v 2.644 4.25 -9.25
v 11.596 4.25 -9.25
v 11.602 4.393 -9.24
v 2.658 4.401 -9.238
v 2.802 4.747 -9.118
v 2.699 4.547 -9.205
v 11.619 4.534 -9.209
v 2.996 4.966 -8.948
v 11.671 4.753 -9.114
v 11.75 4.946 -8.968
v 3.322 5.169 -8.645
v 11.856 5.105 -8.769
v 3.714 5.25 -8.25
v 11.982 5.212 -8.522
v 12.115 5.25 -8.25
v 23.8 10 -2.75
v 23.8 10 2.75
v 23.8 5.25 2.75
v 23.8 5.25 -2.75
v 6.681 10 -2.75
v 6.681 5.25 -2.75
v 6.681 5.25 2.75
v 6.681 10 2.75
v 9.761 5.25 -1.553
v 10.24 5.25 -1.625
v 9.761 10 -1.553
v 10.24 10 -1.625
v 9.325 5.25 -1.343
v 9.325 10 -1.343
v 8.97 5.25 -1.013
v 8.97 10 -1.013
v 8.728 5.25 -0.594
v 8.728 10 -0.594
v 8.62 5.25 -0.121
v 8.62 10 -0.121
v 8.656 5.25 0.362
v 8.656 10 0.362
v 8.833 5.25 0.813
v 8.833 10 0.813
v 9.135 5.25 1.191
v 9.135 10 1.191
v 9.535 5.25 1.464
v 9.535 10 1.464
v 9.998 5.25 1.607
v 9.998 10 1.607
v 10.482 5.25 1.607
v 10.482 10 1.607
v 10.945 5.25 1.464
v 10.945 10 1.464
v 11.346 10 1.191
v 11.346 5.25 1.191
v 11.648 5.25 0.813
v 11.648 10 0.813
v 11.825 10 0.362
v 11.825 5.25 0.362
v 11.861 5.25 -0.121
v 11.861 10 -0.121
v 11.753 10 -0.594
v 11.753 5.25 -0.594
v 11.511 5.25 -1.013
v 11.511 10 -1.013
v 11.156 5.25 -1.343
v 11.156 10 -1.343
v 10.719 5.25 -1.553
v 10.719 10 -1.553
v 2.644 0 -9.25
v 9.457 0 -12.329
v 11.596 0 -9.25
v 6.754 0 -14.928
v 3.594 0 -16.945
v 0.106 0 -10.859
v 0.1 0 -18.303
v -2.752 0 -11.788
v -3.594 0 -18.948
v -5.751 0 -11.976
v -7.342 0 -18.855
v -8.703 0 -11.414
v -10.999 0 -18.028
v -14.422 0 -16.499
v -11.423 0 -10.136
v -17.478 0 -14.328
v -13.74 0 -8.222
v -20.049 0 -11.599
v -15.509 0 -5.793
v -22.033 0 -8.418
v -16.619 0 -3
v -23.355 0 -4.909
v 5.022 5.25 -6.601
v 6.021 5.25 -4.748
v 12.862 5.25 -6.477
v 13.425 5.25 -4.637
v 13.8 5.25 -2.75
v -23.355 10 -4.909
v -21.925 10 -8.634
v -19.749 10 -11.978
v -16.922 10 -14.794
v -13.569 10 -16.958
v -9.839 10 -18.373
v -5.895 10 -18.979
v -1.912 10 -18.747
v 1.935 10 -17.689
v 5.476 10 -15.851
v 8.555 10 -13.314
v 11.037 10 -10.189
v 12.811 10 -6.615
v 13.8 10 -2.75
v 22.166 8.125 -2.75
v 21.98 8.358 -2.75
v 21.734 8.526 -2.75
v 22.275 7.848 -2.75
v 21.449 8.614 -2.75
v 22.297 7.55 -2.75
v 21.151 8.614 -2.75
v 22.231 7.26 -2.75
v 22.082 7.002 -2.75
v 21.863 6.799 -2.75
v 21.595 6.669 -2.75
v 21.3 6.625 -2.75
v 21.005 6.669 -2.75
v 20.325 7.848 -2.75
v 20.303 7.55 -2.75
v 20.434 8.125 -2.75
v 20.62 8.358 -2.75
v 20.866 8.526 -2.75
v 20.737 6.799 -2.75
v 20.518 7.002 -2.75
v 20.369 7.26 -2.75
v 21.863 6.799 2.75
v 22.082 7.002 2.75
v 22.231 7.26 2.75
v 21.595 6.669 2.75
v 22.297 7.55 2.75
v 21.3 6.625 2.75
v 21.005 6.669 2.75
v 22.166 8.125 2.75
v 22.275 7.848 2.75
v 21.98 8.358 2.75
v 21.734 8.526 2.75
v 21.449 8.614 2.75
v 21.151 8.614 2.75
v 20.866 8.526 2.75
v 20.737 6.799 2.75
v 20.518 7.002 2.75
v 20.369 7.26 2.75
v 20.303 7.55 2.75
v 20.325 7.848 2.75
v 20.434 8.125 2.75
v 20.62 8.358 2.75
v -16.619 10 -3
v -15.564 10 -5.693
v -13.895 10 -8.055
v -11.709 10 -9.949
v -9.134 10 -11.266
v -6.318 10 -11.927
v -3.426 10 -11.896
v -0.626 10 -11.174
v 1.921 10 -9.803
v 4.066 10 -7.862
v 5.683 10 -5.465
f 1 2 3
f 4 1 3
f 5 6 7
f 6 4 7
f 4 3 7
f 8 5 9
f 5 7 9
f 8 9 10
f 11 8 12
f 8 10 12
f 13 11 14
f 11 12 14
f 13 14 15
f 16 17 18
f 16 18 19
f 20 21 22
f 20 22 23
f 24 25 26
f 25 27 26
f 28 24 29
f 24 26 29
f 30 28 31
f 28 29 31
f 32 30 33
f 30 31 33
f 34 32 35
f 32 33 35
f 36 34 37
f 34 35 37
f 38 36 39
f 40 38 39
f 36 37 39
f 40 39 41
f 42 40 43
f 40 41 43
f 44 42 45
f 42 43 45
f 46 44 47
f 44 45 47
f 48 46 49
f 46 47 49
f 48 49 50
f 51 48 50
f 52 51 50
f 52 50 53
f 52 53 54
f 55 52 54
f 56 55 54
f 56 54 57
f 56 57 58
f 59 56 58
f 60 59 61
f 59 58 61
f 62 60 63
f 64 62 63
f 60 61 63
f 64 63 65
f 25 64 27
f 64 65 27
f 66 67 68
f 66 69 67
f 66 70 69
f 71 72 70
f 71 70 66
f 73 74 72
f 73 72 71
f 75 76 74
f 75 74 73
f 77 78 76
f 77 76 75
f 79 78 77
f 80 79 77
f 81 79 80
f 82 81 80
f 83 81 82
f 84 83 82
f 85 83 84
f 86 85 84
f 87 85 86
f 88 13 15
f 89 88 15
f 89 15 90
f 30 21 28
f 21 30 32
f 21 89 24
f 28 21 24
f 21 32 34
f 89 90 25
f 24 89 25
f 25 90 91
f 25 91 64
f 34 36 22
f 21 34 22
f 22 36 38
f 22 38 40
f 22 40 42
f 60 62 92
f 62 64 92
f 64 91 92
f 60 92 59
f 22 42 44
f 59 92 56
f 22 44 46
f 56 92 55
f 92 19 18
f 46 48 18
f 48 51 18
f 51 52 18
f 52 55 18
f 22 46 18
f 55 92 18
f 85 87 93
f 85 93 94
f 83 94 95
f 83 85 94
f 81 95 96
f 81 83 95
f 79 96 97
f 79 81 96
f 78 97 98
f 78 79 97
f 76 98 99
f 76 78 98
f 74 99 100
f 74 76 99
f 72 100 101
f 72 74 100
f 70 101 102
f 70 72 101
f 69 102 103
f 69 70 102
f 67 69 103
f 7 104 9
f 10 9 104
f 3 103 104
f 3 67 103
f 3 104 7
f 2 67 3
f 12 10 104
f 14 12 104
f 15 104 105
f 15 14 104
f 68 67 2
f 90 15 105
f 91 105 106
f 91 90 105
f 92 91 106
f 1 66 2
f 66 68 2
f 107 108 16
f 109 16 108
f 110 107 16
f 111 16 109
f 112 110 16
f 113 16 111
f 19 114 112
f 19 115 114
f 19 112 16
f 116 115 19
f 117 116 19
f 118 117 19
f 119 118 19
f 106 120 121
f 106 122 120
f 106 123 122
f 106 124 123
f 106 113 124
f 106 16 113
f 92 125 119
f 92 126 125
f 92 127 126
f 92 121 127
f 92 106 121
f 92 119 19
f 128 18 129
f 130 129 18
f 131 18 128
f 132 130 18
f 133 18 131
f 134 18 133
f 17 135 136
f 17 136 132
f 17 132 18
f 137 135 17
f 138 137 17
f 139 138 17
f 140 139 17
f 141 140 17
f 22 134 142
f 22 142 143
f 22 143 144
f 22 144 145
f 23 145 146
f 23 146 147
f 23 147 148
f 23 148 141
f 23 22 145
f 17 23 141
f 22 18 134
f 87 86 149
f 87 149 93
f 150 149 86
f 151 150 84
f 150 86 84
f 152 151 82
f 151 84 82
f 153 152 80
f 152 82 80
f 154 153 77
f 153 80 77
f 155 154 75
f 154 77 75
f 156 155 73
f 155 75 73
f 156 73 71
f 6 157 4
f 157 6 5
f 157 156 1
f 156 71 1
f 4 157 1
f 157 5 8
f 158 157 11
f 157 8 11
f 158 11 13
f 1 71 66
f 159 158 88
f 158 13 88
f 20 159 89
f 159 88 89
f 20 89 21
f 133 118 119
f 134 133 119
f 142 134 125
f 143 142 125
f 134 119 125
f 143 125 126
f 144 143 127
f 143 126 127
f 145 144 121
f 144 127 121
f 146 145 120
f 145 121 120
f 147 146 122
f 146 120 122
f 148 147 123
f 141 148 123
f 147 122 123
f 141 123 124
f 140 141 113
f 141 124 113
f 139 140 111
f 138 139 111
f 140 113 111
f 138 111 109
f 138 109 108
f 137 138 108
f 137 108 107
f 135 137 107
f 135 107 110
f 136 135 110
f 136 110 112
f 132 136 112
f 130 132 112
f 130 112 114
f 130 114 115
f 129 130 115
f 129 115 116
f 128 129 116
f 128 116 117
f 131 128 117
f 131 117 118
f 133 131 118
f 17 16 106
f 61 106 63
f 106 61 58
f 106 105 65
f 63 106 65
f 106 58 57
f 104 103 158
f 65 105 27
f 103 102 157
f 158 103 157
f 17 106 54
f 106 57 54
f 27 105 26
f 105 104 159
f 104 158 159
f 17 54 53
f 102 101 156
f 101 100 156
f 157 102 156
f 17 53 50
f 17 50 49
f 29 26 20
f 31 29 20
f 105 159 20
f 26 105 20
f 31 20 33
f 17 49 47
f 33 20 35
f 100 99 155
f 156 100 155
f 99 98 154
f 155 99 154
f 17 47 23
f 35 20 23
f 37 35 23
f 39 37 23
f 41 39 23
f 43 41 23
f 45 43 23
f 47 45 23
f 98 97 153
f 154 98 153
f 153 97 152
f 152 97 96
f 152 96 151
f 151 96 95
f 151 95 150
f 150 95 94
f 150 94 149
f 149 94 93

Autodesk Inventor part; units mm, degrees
ref_plane "YZ Plane" through (0, 0, 0) normal (1, 0, 0) x (0, 1, 0)
ref_plane "XZ Plane" through (0, 0, 0) normal (0, 1, 0) x (-1, 0, 0)
sketch "Sketch1" plane through (0, 0, 0) normal (0, 1, 0) x (-1, 0, 0)
  line L0 (5, 0) -> (16.619, -3)
  line L1 (5, 0) -> (-7, 0)
  arc A0 (-7, 0) -> (16.619, -3) centre (5, 0) ccw
  line L2 (0, 0) -> (-12, 0)
  arc A1 (-14, 0) -> (23.3548, -4.9094) centre (5, 0) ccw
  line L3 (16.619, -3) -> (23.3548, -4.9094)
  line L4 (-7, 0) -> (-14, 0)
  point P0 (-7, 0)
  dimension "d0" = 12
  dimension "d2" = 3
  dimension "d3" = 12
  dimension "d4" = 0
  dimension "d5" = 5
  dimension "d6" = 0
  dimension "d7" = 7
extrude "Extrusion1" add sketch "Sketch1" along normal blind 10 contours L3 A1 L4 L2 A0
ref_plane "Work Plane1" through (7, 0, -2.75) normal (0, 0, 1) x (1, 0, 0)
split "Split1" plane through (7, 0, -2.75) removes the side toward (0, 0, 1)
sketch "Sketch2" plane through (6.6806, 0, -2.75) normal (0, 0, 1) x (1, 0, 0)
  line L0 (0, 0) -> (0, 10) projected
  line L1 (7.1193, 0) -> (0, 0) projected
  line L2 (7.1193, 10) -> (7.1193, 0) projected
  line L3 (0, 10) -> (7.1193, 10) projected
  point P0 (-6.6806, 0)
extrude "Extrusion2" add sketch "Sketch2" along normal blind 5.5
sketch "Sketch3" plane through (13.7999, 0, -2.75) normal (1, 0, 0) x (0, 0, -1)
  line L0 (0, 10) -> (0, 0) projected
  line L1 (0, 10) -> (-5.5, 10) projected
  line L2 (-5.5, 0) -> (-5.5, 10) projected
  line L3 (0, 0) -> (-5.5, 0) projected
  point P0 (-2.75, 0)
extrude "Extrusion3" add sketch "Sketch3" along normal blind 10
sketch "Sketch4" plane through (0, 0, 0) normal (0, -1, 0) x (1, 0, 0)
  line L0 (6.6806, -2.75) -> (6.6806, 2.75) projected
  point P0 (0, 0)
  point P1 (10.2403, 0)
  point P2 (13.7999, -2.75)
  dimension "d15" = 0
  dimension "d16" = 3.5596
  dimension "d17" = 7.1193
hole "Hole1" at (10.2403, 0, 0) direction (0, 1, 0) diameter 3.25 end through all
sketch "Sketch5" plane through (6.6806, 0, -2.75) normal (-1, 0, 0) x (0, 0, 1)
  line L0 (5.5, 0) -> (-6.5, 0)
  line L1 (-6.5, 0) -> (-6.5, 5.25)
  line L2 (-6.5, 5.25) -> (5.5, 5.25)
  line L3 (5.5, 5.25) -> (5.5, 0)
  line L4 (0, 12) -> (0, -2) projected
  dimension "d29" = 5.25
  dimension "d30" = 6.5
extrude "halfCut" cut sketch "Sketch5" along normal blind 5.5 and the other way blind 20
fillet "Fillet1" radius 1 1 edges at (7.1204, 5.25, -9.25)
sketch "Sketch6" plane through (6.6806, 0, 2.75) normal (0, 0, 1) x (1, 0, 0)
  line L0 (0, 10) -> (17.1193, 10) projected
  line L1 (0, 5.25) -> (17.1193, 5.25) projected
  line L2 (17.1193, 10) -> (17.1193, 5.25) projected
  point P0 (-6.6806, 0)
  point P1 (14.6193, 7.625)
  dimension "d33" = 2.375
  dimension "d34" = 4.75
  dimension "d35" = 2.5
hole "Hole2" at (21.2999, 7.625, 2.75) direction (0, 0, -1) diameter 2 end through all
equation "\"d0\" = r"
equation "\"d2\" = 0.5 * a1"
equation "\"d3\" = r"
equation "\"d7\" = t"
equation "\"d11\" = a2"
equation "\"d16\" = 0.5 * d17"
equation "\"d18\" = dpin"
equation "\"d28\" = fillet"
equation "\"d33\" = 0.5 * d34"
equation "\"d36\" = dcable"
equation "\"r\" = 12"
equation "\"t\" = 7"
equation "\"a1\" = 6"
equation "\"a2\" = 5.5"
equation "\"d10\" = -0.5 * a2"
equation "\"dpin\" = 3.25"
equation "\"fillet\" = 1"
equation "\"dcable\" = 2"
properties part number "holder2_clamp" material "Steel, Mild"
